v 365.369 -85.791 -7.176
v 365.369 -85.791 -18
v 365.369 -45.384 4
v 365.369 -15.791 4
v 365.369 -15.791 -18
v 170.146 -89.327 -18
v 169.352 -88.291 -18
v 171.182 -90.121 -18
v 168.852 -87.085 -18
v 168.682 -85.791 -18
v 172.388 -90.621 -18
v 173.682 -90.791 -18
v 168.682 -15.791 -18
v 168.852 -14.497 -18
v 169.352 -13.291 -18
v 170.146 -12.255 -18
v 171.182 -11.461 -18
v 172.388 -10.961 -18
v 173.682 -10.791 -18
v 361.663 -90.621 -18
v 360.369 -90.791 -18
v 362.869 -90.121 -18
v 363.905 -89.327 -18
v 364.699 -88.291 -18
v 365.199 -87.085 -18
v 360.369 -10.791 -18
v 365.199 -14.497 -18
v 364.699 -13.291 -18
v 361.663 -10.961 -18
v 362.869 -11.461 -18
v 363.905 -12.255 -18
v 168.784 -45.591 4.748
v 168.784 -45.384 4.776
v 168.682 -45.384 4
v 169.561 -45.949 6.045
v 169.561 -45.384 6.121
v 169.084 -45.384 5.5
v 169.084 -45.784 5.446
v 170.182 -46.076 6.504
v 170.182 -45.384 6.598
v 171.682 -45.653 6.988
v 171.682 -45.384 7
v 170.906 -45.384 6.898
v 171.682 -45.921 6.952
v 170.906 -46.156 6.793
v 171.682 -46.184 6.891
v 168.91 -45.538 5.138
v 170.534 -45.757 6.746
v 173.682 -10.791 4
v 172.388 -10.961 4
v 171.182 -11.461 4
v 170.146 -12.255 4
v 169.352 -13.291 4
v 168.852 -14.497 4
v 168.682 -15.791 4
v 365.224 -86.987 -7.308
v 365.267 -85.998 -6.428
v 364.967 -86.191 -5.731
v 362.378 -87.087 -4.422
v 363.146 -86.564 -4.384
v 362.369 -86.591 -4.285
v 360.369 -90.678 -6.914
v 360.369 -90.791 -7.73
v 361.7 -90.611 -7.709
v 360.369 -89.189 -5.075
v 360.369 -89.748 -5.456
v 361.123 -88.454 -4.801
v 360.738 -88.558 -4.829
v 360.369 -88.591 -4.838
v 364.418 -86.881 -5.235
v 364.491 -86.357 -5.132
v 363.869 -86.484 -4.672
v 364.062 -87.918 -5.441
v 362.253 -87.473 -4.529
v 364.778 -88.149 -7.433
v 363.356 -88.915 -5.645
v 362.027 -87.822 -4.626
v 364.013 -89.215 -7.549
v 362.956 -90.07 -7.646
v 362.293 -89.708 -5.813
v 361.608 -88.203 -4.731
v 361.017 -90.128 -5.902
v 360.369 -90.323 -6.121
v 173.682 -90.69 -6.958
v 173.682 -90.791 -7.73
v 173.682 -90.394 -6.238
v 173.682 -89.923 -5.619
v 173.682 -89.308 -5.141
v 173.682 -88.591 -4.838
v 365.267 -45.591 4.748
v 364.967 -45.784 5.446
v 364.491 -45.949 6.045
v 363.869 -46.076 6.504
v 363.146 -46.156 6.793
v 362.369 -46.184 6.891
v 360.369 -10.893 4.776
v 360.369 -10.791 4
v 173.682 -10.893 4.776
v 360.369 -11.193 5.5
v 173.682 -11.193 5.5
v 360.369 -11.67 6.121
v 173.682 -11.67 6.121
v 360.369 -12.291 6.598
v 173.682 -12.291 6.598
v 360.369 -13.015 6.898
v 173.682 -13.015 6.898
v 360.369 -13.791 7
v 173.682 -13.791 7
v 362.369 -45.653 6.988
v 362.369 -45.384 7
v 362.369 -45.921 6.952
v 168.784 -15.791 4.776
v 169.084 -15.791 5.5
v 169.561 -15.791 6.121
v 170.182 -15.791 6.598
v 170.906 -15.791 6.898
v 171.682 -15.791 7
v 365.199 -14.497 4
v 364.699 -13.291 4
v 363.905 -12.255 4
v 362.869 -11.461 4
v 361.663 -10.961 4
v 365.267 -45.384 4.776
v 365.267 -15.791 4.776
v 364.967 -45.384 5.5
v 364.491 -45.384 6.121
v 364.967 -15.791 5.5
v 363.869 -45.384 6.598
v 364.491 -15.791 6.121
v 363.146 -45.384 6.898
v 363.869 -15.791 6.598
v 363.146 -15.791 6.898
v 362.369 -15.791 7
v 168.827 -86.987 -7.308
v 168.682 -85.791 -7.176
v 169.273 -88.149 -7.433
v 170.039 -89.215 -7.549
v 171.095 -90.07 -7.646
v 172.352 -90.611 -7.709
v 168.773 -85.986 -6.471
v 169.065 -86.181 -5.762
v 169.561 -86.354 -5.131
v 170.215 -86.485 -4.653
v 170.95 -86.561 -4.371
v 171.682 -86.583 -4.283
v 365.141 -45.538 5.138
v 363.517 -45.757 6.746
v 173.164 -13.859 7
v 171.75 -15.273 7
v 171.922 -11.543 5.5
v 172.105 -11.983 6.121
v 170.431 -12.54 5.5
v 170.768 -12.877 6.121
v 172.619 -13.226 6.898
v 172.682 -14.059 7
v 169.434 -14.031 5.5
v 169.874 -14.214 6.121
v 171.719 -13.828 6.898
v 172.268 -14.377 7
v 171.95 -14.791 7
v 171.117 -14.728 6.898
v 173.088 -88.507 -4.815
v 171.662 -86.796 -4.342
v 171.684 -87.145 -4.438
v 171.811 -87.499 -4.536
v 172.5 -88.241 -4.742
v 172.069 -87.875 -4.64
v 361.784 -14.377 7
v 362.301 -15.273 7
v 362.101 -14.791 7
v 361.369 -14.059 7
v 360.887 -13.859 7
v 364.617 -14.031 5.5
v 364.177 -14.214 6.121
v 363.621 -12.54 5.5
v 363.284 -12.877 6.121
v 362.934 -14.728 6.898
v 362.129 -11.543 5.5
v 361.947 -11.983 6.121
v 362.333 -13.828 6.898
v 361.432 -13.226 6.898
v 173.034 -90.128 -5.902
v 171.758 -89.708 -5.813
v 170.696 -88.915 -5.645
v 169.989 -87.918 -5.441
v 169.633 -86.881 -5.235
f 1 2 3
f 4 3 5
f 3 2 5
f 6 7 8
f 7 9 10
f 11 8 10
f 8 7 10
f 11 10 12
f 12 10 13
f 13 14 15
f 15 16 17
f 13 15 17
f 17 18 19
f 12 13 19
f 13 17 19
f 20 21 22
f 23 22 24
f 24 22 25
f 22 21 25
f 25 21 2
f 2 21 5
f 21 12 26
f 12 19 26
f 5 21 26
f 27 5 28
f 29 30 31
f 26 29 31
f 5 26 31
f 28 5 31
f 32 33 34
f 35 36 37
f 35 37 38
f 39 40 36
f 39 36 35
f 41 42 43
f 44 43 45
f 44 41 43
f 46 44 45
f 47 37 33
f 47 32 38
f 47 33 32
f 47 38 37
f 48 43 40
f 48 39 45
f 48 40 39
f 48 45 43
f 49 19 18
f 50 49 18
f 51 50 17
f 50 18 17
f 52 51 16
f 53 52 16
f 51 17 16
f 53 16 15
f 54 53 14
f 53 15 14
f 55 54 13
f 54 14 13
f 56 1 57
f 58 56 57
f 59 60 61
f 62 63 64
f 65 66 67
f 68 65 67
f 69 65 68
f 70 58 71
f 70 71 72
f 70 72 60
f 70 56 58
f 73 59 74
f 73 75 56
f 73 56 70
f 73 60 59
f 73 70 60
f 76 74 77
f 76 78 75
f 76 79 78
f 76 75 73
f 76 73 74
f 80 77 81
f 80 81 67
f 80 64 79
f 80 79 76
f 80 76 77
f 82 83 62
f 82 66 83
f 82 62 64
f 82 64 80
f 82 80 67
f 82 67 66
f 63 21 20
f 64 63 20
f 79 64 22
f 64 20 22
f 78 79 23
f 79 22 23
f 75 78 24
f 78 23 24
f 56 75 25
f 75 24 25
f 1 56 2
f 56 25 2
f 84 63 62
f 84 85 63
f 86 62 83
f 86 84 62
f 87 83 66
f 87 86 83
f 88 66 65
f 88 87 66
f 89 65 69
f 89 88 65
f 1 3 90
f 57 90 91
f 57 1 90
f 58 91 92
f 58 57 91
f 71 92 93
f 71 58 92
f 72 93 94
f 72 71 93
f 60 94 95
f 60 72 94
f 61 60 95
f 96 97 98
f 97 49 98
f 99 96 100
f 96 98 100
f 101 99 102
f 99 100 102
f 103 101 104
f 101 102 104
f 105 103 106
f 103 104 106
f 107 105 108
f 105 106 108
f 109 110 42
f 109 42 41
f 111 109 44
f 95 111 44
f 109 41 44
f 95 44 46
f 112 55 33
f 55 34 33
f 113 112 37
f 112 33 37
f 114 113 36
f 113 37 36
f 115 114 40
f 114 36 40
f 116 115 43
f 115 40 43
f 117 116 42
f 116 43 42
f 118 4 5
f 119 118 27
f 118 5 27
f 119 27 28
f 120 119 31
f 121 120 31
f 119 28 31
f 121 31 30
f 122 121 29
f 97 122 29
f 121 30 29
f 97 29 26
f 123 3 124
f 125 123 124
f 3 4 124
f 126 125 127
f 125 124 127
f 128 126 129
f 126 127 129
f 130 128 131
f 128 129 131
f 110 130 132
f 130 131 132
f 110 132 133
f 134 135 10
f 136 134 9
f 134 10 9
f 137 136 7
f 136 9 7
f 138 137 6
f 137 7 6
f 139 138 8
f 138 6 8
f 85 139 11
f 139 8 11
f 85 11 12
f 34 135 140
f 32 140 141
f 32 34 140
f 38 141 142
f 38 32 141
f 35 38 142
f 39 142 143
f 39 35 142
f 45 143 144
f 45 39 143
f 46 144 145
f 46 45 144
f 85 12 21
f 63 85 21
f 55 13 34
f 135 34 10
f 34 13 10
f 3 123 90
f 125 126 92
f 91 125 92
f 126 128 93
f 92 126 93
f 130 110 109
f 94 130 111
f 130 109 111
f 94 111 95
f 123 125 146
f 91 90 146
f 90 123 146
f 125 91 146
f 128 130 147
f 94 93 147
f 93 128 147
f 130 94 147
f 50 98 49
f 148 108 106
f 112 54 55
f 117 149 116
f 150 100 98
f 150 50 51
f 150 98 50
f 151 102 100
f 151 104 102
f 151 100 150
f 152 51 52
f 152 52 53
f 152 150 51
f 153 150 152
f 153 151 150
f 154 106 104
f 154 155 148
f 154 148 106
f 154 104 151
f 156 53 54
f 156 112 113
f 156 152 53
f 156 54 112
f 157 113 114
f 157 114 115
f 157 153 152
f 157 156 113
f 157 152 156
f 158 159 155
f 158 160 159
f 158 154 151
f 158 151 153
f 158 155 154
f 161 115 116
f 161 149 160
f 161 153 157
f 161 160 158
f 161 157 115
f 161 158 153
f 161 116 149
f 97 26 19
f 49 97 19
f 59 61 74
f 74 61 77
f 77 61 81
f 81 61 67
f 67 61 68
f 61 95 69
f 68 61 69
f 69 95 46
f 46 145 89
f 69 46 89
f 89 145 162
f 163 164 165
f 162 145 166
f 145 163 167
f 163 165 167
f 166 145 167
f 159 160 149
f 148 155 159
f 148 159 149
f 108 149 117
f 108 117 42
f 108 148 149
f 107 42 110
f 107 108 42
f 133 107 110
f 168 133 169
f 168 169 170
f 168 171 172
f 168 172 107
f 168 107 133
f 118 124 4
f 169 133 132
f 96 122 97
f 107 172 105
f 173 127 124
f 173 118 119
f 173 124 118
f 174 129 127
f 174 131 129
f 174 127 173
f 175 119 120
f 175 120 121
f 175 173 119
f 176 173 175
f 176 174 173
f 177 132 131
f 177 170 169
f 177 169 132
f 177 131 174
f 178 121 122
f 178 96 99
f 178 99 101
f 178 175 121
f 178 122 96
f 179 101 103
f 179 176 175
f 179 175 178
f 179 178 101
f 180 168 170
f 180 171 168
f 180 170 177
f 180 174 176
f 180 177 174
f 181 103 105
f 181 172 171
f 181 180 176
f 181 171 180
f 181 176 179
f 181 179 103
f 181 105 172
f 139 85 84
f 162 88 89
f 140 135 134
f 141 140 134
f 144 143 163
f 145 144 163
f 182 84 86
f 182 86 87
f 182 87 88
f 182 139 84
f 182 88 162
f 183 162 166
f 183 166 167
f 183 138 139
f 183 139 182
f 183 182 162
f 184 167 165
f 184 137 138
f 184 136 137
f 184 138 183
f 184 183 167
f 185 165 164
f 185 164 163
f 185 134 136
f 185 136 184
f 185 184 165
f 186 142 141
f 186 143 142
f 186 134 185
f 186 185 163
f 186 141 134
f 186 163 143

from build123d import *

# Parameters (mm, degrees)
RIGHT_PALM_PAD_DEPTH        = 25
RIGHT_PALM_WEDGE_DEPTH      = 5.38135
RIGHT_PALM_WEDGE_DEPTH_BACK = 191.308
RIGHT_PALM_FILLET_R         = 3


with BuildPart() as part:
    # Right_Palm_Base → Right_Palm_Pad (new body)
    with BuildSketch(Plane.XY.offset(-18)):
        with BuildLine():
            Line((-0.38035, -90.791), (186.307, -90.791))
            ThreePointArc((186.307, -90.791), (189.842534, -89.326534), (191.307, -85.791))
            Line((191.307, -85.791), (191.307, -15.791))
            ThreePointArc((191.307, -15.791), (189.842534, -12.255466), (186.307, -10.791))
            Line((186.307, -10.791), (-0.38035, -10.791))
            ThreePointArc((-0.38035, -10.791), (-3.915884, -12.255466), (-5.38035, -15.791))
            Line((-5.38035, -15.791), (-5.38035, -85.791))
            ThreePointArc((-5.38035, -85.791), (-3.915884, -89.326534), (-0.38035, -90.791))
        make_face()
    extrude(amount=RIGHT_PALM_PAD_DEPTH)

    # Right_Palm_WedgeCut → Right_Palm_Wedge (cut, two sides)
    with BuildSketch(Plane.YZ) as right_palm_wedge_sk:
        Polygon((-45.791, 7), (-92.791, -6), (-92.791, 9), (-45.791, 9), align=None)
    extrude(amount=-RIGHT_PALM_WEDGE_DEPTH, mode=Mode.SUBTRACT)
    extrude(right_palm_wedge_sk.sketch, amount=RIGHT_PALM_WEDGE_DEPTH_BACK, mode=Mode.SUBTRACT)

    # Right_Palm_Fillet
    right_palm_fillet_edges = [part.edges().sort_by_distance(p)[0] for p in [
        (92.963325, -90.791, -5.446809),
        (189.874947, -89.293821, -5.032695),
        (92.963325, -45.791, 7),
        (-5.38035, -65.791, 1.468085),
        (-3.948297, -89.293821, -5.032695),
        (191.307, -65.791, 1.468085),
        (191.307, -30.791, 7),
        (189.842534, -12.255466, 7),
        (92.963325, -10.791, 7),
        (-3.915884, -12.255466, 7),
        (-5.38035, -30.791, 7),
    ]]
    fillet(right_palm_fillet_edges, radius=RIGHT_PALM_FILLET_R)


with BuildPart() as part_1:
    # Right_Palm_Rest placement: moved
    add(part.part.moved(Location((174.06235, 0, 0))))


solid = part_1.part
